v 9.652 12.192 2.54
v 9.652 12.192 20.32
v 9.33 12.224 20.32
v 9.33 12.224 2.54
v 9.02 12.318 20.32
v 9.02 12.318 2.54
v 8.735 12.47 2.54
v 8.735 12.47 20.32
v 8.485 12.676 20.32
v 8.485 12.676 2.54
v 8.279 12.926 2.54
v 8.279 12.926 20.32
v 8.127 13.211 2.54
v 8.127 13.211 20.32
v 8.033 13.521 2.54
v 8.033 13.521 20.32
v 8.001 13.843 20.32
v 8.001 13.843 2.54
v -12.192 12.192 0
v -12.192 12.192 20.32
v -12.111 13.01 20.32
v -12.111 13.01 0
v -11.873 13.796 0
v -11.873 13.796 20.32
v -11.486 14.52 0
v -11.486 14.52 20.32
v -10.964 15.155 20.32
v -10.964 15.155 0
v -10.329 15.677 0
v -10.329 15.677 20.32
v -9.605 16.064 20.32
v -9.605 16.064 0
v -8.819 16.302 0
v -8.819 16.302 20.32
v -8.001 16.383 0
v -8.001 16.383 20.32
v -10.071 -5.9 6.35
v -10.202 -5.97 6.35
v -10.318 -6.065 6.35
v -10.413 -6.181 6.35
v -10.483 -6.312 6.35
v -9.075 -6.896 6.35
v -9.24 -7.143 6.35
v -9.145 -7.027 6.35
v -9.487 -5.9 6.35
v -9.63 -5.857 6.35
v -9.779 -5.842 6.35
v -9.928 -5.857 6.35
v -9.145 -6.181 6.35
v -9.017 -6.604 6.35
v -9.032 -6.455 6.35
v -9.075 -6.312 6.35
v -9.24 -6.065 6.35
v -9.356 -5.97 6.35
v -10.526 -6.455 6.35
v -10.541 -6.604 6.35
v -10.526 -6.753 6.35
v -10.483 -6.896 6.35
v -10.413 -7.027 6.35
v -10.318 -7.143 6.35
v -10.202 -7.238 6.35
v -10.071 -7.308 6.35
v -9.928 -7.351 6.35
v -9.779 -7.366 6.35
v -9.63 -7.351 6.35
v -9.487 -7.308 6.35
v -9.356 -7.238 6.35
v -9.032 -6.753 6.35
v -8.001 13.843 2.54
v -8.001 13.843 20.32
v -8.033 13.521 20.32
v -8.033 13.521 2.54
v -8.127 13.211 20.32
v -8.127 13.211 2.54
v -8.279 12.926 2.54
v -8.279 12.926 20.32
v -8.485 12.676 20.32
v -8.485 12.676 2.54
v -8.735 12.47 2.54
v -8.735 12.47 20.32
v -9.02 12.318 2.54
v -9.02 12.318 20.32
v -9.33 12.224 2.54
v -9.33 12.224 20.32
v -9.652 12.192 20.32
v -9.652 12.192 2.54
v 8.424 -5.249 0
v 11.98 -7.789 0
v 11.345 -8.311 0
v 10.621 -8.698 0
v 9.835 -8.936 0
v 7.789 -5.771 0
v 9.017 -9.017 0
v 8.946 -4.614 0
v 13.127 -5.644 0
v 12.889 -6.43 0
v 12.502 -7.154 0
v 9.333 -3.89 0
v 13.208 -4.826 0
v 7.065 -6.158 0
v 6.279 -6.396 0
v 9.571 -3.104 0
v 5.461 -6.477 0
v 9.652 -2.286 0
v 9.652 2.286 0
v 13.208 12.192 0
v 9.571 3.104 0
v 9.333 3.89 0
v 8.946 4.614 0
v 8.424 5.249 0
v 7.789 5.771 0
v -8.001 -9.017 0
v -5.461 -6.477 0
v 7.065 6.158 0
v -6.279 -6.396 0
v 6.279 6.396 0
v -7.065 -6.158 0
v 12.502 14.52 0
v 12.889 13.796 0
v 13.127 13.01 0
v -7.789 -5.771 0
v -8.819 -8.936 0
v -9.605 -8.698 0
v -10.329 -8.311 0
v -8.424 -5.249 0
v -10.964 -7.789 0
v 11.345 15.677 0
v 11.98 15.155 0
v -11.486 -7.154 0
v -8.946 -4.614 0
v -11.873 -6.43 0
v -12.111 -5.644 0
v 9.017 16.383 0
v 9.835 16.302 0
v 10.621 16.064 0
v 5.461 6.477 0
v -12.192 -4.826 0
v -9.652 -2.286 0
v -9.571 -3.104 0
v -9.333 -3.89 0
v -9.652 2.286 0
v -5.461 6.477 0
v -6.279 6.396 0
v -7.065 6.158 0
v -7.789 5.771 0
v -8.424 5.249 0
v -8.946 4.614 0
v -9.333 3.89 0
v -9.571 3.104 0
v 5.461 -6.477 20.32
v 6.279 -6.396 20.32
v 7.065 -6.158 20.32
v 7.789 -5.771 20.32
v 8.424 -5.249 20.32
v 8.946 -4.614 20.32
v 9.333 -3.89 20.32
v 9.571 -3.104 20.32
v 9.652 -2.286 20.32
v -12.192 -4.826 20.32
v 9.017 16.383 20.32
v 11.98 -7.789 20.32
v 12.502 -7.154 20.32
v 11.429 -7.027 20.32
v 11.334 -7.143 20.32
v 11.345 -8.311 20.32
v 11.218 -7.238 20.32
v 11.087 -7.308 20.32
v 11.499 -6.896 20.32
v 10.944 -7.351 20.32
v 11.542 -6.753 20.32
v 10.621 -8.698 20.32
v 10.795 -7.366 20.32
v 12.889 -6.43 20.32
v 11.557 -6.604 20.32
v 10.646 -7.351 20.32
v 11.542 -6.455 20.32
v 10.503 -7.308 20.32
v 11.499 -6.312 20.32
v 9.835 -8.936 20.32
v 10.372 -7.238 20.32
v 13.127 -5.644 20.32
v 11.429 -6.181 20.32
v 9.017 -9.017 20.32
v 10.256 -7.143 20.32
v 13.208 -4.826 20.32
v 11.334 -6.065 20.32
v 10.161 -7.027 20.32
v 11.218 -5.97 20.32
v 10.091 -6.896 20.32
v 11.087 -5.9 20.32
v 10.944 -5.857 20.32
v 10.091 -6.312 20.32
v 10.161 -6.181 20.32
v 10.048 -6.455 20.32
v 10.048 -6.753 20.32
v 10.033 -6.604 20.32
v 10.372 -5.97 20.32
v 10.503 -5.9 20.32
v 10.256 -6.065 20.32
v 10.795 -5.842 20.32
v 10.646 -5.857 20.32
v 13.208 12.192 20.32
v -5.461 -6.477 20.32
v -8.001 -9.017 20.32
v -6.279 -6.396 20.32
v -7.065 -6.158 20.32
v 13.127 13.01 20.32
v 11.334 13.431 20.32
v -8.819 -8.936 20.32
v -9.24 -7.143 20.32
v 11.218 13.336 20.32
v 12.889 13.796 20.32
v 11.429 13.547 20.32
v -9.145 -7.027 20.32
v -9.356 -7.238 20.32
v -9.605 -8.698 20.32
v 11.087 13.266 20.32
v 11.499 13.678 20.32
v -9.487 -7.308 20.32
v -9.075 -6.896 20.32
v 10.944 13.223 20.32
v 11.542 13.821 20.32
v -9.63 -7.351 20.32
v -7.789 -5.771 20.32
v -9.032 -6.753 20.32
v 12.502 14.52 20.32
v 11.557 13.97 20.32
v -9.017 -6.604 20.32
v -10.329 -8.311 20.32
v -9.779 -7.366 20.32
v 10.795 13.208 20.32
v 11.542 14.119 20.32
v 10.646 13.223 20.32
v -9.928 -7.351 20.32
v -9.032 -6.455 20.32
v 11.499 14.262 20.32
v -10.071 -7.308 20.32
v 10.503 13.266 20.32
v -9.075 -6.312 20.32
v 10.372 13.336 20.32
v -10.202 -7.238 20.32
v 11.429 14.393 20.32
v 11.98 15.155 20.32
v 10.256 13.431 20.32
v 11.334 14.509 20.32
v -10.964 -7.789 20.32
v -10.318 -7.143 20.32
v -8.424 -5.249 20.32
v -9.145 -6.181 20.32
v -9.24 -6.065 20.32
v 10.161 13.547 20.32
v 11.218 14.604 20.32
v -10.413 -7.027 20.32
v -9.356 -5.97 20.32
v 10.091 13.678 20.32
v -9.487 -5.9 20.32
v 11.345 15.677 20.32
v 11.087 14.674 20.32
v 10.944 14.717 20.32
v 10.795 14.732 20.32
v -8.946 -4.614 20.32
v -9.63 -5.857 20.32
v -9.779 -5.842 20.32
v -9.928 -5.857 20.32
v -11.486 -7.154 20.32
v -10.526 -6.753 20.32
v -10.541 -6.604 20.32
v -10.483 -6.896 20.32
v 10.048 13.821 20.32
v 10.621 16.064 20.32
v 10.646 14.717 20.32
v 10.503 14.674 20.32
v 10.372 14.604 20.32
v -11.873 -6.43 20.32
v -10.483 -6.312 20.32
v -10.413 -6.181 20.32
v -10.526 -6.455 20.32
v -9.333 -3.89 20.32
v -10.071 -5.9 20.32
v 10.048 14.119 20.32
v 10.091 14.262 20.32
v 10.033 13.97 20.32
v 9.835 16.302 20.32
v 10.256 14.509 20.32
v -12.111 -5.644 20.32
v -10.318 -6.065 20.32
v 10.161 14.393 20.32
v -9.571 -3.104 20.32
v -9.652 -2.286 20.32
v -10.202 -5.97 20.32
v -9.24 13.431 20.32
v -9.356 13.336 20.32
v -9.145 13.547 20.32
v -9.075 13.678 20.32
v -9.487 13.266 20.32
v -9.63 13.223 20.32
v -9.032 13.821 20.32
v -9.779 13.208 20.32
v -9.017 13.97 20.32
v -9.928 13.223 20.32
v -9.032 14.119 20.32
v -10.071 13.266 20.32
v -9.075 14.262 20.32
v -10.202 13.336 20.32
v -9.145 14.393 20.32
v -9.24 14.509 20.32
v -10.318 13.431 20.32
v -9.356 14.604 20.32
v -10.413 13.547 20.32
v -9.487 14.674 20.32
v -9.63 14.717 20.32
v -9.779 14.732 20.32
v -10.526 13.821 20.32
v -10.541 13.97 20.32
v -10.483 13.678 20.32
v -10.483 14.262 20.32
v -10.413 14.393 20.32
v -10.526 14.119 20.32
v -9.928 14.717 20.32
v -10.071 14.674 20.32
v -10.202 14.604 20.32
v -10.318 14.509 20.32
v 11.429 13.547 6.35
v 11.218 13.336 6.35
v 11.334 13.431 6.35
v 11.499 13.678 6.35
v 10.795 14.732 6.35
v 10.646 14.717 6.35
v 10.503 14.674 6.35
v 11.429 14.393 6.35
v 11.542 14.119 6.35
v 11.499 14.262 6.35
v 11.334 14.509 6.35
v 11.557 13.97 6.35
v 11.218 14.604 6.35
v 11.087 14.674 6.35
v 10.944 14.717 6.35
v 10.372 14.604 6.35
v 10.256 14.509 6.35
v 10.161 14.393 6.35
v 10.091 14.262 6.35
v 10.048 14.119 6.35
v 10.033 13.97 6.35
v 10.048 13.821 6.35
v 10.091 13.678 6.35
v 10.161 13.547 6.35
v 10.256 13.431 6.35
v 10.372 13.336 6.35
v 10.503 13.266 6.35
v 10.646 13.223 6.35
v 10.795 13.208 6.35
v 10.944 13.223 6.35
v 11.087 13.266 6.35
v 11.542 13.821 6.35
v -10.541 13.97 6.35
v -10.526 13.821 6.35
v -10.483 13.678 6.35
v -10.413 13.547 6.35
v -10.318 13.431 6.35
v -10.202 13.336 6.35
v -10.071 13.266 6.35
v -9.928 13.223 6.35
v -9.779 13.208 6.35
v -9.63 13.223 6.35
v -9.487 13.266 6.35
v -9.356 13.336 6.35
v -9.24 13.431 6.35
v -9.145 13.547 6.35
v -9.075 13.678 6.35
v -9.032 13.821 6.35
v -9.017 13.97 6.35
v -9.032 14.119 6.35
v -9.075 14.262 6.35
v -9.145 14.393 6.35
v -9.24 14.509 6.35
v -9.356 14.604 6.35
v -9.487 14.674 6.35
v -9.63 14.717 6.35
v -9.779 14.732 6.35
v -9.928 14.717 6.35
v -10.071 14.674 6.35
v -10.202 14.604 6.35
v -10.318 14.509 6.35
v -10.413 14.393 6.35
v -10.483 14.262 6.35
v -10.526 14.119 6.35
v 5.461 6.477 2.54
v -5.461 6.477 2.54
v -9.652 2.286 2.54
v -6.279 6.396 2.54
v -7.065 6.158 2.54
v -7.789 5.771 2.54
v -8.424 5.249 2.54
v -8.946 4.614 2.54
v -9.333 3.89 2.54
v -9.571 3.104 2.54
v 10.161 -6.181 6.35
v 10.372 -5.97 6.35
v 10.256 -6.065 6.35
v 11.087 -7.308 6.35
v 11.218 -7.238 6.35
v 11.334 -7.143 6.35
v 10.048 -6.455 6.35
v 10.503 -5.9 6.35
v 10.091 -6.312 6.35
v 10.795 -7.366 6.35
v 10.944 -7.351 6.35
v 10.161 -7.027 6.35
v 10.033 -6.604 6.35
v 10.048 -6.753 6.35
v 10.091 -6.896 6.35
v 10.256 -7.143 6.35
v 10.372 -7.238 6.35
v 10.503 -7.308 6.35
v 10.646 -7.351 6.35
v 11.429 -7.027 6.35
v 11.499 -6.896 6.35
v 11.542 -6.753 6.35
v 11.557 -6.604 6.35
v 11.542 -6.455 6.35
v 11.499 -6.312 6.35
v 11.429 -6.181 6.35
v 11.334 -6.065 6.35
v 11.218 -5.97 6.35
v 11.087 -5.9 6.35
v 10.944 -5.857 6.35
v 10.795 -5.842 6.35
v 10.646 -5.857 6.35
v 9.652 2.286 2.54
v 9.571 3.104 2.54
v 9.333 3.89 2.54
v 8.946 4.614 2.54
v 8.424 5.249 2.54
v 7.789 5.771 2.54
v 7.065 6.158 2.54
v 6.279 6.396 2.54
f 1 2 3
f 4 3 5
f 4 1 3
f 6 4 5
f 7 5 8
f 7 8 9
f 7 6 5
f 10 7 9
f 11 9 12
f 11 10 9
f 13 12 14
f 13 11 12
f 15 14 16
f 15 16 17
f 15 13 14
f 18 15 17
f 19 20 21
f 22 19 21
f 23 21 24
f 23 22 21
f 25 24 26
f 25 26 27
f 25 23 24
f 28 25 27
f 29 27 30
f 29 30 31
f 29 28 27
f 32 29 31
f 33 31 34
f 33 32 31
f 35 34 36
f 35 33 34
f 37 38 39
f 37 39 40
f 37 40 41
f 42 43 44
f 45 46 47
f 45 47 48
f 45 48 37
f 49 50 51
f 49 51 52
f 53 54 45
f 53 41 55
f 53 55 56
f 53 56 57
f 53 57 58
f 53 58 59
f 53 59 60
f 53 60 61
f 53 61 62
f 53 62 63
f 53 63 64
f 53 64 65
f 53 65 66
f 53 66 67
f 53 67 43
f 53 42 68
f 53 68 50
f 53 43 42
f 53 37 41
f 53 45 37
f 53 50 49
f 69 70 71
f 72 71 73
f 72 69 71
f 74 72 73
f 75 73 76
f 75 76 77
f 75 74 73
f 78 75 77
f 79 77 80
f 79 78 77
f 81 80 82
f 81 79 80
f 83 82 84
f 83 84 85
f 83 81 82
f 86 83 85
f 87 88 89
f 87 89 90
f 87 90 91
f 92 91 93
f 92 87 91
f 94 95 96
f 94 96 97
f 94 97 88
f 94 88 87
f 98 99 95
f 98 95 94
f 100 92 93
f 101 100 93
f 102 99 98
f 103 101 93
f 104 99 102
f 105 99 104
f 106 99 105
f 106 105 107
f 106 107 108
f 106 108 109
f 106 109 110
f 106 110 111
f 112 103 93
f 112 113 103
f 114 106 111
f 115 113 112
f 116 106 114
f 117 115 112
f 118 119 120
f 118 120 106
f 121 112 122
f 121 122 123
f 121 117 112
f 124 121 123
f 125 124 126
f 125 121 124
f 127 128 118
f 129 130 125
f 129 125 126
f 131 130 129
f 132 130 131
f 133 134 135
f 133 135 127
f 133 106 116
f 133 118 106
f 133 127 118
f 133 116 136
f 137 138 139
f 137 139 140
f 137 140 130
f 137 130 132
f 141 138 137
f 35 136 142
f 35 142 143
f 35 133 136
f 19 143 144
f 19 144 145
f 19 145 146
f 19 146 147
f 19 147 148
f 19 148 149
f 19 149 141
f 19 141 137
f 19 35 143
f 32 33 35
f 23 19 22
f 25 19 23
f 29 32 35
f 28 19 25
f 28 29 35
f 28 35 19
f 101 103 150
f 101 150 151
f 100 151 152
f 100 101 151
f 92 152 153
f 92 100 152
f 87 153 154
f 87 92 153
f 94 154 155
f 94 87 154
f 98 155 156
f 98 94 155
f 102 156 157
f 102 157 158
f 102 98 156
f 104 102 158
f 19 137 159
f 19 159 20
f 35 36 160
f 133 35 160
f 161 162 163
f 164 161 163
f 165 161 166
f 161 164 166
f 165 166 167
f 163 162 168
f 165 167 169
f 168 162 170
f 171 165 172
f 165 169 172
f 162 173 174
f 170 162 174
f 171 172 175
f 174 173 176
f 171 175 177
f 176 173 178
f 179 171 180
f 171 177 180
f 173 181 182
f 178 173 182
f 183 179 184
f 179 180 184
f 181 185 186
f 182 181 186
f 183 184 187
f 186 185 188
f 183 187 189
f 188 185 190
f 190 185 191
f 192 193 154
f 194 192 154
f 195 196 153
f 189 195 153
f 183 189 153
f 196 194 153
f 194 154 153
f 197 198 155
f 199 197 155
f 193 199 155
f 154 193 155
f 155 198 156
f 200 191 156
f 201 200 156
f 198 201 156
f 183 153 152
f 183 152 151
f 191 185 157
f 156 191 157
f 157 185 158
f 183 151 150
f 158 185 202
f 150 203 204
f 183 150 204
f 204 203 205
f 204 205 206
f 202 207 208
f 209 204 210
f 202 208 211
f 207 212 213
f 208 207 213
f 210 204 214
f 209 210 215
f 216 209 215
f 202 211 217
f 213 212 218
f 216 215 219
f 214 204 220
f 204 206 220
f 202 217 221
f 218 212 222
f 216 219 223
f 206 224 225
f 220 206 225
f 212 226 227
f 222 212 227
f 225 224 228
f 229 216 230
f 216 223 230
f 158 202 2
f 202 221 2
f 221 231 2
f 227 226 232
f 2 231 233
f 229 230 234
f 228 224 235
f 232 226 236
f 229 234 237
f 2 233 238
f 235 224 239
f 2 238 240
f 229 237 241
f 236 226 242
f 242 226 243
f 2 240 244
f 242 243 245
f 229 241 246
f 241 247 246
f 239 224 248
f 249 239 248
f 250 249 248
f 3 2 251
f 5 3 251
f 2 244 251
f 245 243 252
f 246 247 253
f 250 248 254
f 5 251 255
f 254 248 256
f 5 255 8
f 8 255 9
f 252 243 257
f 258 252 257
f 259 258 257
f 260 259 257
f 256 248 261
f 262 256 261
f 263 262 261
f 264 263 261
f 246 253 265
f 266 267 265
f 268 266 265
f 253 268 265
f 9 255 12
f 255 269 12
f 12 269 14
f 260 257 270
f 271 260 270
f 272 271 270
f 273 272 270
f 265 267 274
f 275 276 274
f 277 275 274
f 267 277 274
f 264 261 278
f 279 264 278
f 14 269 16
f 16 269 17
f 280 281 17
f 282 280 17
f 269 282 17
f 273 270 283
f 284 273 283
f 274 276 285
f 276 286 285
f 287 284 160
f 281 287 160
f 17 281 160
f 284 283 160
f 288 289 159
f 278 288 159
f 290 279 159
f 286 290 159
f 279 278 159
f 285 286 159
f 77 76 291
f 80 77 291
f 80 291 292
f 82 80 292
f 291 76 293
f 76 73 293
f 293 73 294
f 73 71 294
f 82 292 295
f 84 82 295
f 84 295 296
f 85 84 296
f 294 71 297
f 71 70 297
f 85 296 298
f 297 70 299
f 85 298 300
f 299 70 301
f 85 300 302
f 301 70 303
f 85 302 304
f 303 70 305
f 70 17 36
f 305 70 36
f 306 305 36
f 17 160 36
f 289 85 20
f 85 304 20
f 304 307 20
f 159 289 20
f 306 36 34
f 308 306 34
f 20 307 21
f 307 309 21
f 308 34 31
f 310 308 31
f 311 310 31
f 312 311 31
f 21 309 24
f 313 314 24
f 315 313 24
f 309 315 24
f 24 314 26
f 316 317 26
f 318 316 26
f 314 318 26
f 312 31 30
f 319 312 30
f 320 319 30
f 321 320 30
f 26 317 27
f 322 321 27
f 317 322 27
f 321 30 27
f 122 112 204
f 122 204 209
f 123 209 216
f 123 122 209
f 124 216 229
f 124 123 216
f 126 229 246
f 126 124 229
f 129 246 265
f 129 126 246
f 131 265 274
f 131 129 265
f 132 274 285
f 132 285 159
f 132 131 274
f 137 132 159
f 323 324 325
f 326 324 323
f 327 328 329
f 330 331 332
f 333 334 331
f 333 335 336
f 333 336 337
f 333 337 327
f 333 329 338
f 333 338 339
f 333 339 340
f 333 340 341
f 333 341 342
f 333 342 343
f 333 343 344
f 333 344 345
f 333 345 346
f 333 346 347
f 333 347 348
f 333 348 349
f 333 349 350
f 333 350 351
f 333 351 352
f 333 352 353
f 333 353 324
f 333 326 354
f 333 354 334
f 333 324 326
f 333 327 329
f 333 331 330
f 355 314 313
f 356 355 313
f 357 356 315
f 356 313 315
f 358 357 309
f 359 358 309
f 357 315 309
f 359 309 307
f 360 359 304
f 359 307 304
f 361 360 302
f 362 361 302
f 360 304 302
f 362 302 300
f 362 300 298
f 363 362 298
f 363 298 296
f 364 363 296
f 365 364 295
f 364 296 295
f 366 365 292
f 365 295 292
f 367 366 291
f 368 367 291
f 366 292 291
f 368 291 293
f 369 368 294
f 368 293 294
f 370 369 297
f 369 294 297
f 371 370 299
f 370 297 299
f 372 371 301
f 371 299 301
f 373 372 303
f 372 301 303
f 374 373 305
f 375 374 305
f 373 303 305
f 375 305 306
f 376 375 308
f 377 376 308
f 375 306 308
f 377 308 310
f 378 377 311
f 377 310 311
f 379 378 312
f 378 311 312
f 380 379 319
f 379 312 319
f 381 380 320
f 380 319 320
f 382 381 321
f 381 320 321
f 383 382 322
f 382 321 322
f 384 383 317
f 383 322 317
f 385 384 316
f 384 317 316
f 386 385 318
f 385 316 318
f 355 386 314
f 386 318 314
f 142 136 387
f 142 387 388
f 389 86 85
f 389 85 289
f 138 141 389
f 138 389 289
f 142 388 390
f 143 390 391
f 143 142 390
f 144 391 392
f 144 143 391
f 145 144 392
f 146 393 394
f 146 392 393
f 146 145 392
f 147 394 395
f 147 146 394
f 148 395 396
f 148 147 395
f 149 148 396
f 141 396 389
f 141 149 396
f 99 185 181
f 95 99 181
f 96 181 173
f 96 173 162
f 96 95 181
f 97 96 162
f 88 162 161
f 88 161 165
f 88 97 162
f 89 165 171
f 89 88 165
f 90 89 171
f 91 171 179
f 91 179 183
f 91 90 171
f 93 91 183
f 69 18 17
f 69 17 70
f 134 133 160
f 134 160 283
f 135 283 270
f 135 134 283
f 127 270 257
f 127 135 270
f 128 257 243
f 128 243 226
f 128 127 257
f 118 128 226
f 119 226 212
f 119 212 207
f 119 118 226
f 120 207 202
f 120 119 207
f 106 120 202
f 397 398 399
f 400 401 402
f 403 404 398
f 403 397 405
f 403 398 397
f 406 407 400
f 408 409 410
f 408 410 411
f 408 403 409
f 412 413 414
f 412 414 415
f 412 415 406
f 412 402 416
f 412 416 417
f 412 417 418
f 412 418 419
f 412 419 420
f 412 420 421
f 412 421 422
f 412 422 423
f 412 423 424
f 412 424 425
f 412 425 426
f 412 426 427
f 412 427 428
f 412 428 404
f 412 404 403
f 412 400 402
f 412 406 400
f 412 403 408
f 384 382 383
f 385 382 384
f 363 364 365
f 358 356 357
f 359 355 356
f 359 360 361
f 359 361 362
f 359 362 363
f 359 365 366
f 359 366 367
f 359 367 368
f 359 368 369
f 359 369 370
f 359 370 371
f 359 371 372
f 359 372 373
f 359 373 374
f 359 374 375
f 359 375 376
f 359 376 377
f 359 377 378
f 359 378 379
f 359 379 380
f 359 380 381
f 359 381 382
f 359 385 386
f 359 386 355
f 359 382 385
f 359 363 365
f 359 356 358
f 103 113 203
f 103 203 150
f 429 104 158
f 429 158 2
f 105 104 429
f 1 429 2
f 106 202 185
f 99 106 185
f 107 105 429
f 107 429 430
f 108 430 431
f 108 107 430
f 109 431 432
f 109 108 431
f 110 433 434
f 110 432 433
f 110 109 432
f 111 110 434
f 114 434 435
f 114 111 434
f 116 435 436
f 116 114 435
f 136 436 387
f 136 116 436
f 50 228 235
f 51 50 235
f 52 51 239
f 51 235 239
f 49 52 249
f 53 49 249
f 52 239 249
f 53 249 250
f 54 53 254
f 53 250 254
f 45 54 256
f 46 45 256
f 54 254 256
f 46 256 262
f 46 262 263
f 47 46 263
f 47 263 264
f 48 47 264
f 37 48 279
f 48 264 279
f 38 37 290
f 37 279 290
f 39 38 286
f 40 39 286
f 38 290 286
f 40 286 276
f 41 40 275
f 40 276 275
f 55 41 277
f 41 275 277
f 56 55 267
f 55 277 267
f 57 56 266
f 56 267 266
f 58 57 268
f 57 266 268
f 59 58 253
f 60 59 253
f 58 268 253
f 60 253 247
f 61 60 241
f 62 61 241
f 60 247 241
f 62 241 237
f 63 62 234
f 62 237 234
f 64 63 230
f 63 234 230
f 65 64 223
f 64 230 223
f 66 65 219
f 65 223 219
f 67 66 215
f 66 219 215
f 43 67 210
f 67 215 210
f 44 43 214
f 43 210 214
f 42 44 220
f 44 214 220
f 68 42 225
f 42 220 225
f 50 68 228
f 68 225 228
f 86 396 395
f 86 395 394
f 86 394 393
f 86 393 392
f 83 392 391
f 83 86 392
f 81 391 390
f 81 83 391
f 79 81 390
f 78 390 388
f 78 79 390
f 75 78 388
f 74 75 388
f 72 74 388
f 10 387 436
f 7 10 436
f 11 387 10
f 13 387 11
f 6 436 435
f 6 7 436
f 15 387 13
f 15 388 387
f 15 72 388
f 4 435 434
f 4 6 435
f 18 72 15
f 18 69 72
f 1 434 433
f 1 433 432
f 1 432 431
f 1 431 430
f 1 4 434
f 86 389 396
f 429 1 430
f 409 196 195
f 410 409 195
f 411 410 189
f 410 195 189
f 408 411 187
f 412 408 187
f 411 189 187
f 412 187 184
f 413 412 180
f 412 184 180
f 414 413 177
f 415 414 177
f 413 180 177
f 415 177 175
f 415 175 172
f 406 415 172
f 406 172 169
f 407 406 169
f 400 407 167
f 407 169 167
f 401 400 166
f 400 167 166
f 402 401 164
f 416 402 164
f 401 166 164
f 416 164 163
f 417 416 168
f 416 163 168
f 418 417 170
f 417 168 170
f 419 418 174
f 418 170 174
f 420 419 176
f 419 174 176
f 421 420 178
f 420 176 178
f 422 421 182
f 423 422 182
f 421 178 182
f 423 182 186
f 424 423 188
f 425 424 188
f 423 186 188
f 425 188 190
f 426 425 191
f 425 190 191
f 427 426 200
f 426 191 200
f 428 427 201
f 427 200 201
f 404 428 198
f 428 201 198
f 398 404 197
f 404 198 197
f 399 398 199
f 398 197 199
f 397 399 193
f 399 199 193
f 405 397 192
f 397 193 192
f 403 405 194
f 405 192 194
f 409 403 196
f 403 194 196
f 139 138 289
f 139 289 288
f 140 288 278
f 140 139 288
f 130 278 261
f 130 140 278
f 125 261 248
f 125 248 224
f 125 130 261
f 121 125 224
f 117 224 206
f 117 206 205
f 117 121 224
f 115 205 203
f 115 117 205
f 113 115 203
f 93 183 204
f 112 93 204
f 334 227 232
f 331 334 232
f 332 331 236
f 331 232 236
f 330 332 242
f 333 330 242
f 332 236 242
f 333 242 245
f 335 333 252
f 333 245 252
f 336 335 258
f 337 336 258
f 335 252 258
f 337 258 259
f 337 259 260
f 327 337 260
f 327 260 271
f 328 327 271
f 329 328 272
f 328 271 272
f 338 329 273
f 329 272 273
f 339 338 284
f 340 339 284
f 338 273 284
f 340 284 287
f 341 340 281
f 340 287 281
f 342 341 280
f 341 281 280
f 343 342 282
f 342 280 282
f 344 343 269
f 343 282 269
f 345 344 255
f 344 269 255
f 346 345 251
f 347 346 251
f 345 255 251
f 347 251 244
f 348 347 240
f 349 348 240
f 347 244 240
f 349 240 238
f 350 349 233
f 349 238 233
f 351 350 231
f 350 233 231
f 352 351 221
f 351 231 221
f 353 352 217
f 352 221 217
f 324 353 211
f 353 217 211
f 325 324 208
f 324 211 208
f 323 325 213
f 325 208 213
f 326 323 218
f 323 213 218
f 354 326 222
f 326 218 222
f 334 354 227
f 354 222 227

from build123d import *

# Parameters (mm, degrees)
BOSS_EXTRUDE1_DEPTH = 20.32
CUT_EXTRUDE1_START  = -17.78
CUT_EXTRUDE1_DEPTH  = 17.78
SKETCH3_6_R         = 0.762
CUT_EXTRUDE2_DEPTH  = 13.97
SKETCH3_7_R         = 0.762
CUT_EXTRUDE3_DEPTH  = 13.97
SKETCH3_8_R         = 0.762
CUT_EXTRUDE4_DEPTH  = 13.97
SKETCH3_9_R         = 0.762
CUT_EXTRUDE5_DEPTH  = 13.97


with BuildPart() as part:
    # Sketch1 → Boss-Extrude1 (new body)
    with BuildSketch(Plane.XY):
        with BuildLine():
            ThreePointArc((9.017, -9.017), (11.32406957, -8.324844238), (12.869100726, -6.477))
            ThreePointArc((12.869100726, -6.477), (13.122401024, -5.668711949), (13.208, -4.826))
            Line((13.208, -4.826), (13.208, 12.192))
            ThreePointArc((13.208, 12.192), (11.98048452, 15.15548452), (9.017, 16.383))
            Line((9.017, 16.383), (-8.001, 16.383))
            ThreePointArc((-8.001, 16.383), (-10.96448452, 15.15548452), (-12.192, 12.192))
            Line((-12.192, 12.192), (-12.192, -4.826))
            ThreePointArc((-12.192, -4.826), (-10.96448452, -7.78948452), (-8.001, -9.017))
            Line((-8.001, -9.017), (9.017, -9.017))
        make_face()
        with BuildLine():
            Line((5.461, -6.477), (-5.461, -6.477))
            ThreePointArc((-5.461, -6.477), (-8.42448452, -5.24948452), (-9.652, -2.286))
            Line((-9.652, -2.286), (-9.652, 2.286))
            ThreePointArc((-9.652, 2.286), (-8.42448452, 5.24948452), (-5.461, 6.477))
            Line((-5.461, 6.477), (5.461, 6.477))
            ThreePointArc((5.461, 6.477), (8.42448452, 5.24948452), (9.652, 2.286))
            Line((9.652, 2.286), (9.652, -2.286))
            ThreePointArc((9.652, -2.286), (8.42448452, -5.24948452), (5.461, -6.477))
        make_face(mode=Mode.SUBTRACT)
    extrude(amount=BOSS_EXTRUDE1_DEPTH)

    # Sketch3 → Cut-Extrude1 (cut)
    with BuildSketch(Plane.XY.offset(20.32).offset(CUT_EXTRUDE1_START)):
        with BuildLine():
            Line((-9.652, 12.192), (-9.652, 2.286))
            ThreePointArc((-9.652, 2.286), (-8.42448452, 5.24948452), (-5.461, 6.477))
            Line((-5.461, 6.477), (5.461, 6.477))
            ThreePointArc((5.461, 6.477), (8.42448452, 5.24948452), (9.652, 2.286))
            Line((9.652, 2.286), (9.652, 3.683))
            Line((9.652, 3.683), (9.652, 12.192))
            ThreePointArc((9.652, 12.192), (8.484566704, 12.675566704), (8.001, 13.843))
            Line((8.001, 13.843), (-8.001, 13.843))
            ThreePointArc((-8.001, 13.843), (-8.484566704, 12.675566704), (-9.652, 12.192))
        make_face()
    extrude(amount=CUT_EXTRUDE1_DEPTH, mode=Mode.SUBTRACT)

    # Sketch3<6> → Cut-Extrude2 (cut)
    with BuildSketch(Plane.XY.offset(20.32)):
        with Locations((-9.779, 13.97)):
            Circle(SKETCH3_6_R)
    extrude(amount=-CUT_EXTRUDE2_DEPTH, mode=Mode.SUBTRACT)

    # Sketch3<7> → Cut-Extrude3 (cut)
    with BuildSketch(Plane.XY.offset(20.32)):
        with Locations((10.795, 13.97)):
            Circle(SKETCH3_7_R)
    extrude(amount=-CUT_EXTRUDE3_DEPTH, mode=Mode.SUBTRACT)

    # Sketch3<8> → Cut-Extrude4 (cut)
    with BuildSketch(Plane.XY.offset(20.32)):
        with Locations((10.795, -6.604)):
            Circle(SKETCH3_8_R)
    extrude(amount=-CUT_EXTRUDE4_DEPTH, mode=Mode.SUBTRACT)

    # Sketch3<9> → Cut-Extrude5 (cut)
    with BuildSketch(Plane.XY.offset(20.32)):
        with Locations((-9.779, -6.604)):
            Circle(SKETCH3_9_R)
    extrude(amount=-CUT_EXTRUDE5_DEPTH, mode=Mode.SUBTRACT)


solid = part.part
